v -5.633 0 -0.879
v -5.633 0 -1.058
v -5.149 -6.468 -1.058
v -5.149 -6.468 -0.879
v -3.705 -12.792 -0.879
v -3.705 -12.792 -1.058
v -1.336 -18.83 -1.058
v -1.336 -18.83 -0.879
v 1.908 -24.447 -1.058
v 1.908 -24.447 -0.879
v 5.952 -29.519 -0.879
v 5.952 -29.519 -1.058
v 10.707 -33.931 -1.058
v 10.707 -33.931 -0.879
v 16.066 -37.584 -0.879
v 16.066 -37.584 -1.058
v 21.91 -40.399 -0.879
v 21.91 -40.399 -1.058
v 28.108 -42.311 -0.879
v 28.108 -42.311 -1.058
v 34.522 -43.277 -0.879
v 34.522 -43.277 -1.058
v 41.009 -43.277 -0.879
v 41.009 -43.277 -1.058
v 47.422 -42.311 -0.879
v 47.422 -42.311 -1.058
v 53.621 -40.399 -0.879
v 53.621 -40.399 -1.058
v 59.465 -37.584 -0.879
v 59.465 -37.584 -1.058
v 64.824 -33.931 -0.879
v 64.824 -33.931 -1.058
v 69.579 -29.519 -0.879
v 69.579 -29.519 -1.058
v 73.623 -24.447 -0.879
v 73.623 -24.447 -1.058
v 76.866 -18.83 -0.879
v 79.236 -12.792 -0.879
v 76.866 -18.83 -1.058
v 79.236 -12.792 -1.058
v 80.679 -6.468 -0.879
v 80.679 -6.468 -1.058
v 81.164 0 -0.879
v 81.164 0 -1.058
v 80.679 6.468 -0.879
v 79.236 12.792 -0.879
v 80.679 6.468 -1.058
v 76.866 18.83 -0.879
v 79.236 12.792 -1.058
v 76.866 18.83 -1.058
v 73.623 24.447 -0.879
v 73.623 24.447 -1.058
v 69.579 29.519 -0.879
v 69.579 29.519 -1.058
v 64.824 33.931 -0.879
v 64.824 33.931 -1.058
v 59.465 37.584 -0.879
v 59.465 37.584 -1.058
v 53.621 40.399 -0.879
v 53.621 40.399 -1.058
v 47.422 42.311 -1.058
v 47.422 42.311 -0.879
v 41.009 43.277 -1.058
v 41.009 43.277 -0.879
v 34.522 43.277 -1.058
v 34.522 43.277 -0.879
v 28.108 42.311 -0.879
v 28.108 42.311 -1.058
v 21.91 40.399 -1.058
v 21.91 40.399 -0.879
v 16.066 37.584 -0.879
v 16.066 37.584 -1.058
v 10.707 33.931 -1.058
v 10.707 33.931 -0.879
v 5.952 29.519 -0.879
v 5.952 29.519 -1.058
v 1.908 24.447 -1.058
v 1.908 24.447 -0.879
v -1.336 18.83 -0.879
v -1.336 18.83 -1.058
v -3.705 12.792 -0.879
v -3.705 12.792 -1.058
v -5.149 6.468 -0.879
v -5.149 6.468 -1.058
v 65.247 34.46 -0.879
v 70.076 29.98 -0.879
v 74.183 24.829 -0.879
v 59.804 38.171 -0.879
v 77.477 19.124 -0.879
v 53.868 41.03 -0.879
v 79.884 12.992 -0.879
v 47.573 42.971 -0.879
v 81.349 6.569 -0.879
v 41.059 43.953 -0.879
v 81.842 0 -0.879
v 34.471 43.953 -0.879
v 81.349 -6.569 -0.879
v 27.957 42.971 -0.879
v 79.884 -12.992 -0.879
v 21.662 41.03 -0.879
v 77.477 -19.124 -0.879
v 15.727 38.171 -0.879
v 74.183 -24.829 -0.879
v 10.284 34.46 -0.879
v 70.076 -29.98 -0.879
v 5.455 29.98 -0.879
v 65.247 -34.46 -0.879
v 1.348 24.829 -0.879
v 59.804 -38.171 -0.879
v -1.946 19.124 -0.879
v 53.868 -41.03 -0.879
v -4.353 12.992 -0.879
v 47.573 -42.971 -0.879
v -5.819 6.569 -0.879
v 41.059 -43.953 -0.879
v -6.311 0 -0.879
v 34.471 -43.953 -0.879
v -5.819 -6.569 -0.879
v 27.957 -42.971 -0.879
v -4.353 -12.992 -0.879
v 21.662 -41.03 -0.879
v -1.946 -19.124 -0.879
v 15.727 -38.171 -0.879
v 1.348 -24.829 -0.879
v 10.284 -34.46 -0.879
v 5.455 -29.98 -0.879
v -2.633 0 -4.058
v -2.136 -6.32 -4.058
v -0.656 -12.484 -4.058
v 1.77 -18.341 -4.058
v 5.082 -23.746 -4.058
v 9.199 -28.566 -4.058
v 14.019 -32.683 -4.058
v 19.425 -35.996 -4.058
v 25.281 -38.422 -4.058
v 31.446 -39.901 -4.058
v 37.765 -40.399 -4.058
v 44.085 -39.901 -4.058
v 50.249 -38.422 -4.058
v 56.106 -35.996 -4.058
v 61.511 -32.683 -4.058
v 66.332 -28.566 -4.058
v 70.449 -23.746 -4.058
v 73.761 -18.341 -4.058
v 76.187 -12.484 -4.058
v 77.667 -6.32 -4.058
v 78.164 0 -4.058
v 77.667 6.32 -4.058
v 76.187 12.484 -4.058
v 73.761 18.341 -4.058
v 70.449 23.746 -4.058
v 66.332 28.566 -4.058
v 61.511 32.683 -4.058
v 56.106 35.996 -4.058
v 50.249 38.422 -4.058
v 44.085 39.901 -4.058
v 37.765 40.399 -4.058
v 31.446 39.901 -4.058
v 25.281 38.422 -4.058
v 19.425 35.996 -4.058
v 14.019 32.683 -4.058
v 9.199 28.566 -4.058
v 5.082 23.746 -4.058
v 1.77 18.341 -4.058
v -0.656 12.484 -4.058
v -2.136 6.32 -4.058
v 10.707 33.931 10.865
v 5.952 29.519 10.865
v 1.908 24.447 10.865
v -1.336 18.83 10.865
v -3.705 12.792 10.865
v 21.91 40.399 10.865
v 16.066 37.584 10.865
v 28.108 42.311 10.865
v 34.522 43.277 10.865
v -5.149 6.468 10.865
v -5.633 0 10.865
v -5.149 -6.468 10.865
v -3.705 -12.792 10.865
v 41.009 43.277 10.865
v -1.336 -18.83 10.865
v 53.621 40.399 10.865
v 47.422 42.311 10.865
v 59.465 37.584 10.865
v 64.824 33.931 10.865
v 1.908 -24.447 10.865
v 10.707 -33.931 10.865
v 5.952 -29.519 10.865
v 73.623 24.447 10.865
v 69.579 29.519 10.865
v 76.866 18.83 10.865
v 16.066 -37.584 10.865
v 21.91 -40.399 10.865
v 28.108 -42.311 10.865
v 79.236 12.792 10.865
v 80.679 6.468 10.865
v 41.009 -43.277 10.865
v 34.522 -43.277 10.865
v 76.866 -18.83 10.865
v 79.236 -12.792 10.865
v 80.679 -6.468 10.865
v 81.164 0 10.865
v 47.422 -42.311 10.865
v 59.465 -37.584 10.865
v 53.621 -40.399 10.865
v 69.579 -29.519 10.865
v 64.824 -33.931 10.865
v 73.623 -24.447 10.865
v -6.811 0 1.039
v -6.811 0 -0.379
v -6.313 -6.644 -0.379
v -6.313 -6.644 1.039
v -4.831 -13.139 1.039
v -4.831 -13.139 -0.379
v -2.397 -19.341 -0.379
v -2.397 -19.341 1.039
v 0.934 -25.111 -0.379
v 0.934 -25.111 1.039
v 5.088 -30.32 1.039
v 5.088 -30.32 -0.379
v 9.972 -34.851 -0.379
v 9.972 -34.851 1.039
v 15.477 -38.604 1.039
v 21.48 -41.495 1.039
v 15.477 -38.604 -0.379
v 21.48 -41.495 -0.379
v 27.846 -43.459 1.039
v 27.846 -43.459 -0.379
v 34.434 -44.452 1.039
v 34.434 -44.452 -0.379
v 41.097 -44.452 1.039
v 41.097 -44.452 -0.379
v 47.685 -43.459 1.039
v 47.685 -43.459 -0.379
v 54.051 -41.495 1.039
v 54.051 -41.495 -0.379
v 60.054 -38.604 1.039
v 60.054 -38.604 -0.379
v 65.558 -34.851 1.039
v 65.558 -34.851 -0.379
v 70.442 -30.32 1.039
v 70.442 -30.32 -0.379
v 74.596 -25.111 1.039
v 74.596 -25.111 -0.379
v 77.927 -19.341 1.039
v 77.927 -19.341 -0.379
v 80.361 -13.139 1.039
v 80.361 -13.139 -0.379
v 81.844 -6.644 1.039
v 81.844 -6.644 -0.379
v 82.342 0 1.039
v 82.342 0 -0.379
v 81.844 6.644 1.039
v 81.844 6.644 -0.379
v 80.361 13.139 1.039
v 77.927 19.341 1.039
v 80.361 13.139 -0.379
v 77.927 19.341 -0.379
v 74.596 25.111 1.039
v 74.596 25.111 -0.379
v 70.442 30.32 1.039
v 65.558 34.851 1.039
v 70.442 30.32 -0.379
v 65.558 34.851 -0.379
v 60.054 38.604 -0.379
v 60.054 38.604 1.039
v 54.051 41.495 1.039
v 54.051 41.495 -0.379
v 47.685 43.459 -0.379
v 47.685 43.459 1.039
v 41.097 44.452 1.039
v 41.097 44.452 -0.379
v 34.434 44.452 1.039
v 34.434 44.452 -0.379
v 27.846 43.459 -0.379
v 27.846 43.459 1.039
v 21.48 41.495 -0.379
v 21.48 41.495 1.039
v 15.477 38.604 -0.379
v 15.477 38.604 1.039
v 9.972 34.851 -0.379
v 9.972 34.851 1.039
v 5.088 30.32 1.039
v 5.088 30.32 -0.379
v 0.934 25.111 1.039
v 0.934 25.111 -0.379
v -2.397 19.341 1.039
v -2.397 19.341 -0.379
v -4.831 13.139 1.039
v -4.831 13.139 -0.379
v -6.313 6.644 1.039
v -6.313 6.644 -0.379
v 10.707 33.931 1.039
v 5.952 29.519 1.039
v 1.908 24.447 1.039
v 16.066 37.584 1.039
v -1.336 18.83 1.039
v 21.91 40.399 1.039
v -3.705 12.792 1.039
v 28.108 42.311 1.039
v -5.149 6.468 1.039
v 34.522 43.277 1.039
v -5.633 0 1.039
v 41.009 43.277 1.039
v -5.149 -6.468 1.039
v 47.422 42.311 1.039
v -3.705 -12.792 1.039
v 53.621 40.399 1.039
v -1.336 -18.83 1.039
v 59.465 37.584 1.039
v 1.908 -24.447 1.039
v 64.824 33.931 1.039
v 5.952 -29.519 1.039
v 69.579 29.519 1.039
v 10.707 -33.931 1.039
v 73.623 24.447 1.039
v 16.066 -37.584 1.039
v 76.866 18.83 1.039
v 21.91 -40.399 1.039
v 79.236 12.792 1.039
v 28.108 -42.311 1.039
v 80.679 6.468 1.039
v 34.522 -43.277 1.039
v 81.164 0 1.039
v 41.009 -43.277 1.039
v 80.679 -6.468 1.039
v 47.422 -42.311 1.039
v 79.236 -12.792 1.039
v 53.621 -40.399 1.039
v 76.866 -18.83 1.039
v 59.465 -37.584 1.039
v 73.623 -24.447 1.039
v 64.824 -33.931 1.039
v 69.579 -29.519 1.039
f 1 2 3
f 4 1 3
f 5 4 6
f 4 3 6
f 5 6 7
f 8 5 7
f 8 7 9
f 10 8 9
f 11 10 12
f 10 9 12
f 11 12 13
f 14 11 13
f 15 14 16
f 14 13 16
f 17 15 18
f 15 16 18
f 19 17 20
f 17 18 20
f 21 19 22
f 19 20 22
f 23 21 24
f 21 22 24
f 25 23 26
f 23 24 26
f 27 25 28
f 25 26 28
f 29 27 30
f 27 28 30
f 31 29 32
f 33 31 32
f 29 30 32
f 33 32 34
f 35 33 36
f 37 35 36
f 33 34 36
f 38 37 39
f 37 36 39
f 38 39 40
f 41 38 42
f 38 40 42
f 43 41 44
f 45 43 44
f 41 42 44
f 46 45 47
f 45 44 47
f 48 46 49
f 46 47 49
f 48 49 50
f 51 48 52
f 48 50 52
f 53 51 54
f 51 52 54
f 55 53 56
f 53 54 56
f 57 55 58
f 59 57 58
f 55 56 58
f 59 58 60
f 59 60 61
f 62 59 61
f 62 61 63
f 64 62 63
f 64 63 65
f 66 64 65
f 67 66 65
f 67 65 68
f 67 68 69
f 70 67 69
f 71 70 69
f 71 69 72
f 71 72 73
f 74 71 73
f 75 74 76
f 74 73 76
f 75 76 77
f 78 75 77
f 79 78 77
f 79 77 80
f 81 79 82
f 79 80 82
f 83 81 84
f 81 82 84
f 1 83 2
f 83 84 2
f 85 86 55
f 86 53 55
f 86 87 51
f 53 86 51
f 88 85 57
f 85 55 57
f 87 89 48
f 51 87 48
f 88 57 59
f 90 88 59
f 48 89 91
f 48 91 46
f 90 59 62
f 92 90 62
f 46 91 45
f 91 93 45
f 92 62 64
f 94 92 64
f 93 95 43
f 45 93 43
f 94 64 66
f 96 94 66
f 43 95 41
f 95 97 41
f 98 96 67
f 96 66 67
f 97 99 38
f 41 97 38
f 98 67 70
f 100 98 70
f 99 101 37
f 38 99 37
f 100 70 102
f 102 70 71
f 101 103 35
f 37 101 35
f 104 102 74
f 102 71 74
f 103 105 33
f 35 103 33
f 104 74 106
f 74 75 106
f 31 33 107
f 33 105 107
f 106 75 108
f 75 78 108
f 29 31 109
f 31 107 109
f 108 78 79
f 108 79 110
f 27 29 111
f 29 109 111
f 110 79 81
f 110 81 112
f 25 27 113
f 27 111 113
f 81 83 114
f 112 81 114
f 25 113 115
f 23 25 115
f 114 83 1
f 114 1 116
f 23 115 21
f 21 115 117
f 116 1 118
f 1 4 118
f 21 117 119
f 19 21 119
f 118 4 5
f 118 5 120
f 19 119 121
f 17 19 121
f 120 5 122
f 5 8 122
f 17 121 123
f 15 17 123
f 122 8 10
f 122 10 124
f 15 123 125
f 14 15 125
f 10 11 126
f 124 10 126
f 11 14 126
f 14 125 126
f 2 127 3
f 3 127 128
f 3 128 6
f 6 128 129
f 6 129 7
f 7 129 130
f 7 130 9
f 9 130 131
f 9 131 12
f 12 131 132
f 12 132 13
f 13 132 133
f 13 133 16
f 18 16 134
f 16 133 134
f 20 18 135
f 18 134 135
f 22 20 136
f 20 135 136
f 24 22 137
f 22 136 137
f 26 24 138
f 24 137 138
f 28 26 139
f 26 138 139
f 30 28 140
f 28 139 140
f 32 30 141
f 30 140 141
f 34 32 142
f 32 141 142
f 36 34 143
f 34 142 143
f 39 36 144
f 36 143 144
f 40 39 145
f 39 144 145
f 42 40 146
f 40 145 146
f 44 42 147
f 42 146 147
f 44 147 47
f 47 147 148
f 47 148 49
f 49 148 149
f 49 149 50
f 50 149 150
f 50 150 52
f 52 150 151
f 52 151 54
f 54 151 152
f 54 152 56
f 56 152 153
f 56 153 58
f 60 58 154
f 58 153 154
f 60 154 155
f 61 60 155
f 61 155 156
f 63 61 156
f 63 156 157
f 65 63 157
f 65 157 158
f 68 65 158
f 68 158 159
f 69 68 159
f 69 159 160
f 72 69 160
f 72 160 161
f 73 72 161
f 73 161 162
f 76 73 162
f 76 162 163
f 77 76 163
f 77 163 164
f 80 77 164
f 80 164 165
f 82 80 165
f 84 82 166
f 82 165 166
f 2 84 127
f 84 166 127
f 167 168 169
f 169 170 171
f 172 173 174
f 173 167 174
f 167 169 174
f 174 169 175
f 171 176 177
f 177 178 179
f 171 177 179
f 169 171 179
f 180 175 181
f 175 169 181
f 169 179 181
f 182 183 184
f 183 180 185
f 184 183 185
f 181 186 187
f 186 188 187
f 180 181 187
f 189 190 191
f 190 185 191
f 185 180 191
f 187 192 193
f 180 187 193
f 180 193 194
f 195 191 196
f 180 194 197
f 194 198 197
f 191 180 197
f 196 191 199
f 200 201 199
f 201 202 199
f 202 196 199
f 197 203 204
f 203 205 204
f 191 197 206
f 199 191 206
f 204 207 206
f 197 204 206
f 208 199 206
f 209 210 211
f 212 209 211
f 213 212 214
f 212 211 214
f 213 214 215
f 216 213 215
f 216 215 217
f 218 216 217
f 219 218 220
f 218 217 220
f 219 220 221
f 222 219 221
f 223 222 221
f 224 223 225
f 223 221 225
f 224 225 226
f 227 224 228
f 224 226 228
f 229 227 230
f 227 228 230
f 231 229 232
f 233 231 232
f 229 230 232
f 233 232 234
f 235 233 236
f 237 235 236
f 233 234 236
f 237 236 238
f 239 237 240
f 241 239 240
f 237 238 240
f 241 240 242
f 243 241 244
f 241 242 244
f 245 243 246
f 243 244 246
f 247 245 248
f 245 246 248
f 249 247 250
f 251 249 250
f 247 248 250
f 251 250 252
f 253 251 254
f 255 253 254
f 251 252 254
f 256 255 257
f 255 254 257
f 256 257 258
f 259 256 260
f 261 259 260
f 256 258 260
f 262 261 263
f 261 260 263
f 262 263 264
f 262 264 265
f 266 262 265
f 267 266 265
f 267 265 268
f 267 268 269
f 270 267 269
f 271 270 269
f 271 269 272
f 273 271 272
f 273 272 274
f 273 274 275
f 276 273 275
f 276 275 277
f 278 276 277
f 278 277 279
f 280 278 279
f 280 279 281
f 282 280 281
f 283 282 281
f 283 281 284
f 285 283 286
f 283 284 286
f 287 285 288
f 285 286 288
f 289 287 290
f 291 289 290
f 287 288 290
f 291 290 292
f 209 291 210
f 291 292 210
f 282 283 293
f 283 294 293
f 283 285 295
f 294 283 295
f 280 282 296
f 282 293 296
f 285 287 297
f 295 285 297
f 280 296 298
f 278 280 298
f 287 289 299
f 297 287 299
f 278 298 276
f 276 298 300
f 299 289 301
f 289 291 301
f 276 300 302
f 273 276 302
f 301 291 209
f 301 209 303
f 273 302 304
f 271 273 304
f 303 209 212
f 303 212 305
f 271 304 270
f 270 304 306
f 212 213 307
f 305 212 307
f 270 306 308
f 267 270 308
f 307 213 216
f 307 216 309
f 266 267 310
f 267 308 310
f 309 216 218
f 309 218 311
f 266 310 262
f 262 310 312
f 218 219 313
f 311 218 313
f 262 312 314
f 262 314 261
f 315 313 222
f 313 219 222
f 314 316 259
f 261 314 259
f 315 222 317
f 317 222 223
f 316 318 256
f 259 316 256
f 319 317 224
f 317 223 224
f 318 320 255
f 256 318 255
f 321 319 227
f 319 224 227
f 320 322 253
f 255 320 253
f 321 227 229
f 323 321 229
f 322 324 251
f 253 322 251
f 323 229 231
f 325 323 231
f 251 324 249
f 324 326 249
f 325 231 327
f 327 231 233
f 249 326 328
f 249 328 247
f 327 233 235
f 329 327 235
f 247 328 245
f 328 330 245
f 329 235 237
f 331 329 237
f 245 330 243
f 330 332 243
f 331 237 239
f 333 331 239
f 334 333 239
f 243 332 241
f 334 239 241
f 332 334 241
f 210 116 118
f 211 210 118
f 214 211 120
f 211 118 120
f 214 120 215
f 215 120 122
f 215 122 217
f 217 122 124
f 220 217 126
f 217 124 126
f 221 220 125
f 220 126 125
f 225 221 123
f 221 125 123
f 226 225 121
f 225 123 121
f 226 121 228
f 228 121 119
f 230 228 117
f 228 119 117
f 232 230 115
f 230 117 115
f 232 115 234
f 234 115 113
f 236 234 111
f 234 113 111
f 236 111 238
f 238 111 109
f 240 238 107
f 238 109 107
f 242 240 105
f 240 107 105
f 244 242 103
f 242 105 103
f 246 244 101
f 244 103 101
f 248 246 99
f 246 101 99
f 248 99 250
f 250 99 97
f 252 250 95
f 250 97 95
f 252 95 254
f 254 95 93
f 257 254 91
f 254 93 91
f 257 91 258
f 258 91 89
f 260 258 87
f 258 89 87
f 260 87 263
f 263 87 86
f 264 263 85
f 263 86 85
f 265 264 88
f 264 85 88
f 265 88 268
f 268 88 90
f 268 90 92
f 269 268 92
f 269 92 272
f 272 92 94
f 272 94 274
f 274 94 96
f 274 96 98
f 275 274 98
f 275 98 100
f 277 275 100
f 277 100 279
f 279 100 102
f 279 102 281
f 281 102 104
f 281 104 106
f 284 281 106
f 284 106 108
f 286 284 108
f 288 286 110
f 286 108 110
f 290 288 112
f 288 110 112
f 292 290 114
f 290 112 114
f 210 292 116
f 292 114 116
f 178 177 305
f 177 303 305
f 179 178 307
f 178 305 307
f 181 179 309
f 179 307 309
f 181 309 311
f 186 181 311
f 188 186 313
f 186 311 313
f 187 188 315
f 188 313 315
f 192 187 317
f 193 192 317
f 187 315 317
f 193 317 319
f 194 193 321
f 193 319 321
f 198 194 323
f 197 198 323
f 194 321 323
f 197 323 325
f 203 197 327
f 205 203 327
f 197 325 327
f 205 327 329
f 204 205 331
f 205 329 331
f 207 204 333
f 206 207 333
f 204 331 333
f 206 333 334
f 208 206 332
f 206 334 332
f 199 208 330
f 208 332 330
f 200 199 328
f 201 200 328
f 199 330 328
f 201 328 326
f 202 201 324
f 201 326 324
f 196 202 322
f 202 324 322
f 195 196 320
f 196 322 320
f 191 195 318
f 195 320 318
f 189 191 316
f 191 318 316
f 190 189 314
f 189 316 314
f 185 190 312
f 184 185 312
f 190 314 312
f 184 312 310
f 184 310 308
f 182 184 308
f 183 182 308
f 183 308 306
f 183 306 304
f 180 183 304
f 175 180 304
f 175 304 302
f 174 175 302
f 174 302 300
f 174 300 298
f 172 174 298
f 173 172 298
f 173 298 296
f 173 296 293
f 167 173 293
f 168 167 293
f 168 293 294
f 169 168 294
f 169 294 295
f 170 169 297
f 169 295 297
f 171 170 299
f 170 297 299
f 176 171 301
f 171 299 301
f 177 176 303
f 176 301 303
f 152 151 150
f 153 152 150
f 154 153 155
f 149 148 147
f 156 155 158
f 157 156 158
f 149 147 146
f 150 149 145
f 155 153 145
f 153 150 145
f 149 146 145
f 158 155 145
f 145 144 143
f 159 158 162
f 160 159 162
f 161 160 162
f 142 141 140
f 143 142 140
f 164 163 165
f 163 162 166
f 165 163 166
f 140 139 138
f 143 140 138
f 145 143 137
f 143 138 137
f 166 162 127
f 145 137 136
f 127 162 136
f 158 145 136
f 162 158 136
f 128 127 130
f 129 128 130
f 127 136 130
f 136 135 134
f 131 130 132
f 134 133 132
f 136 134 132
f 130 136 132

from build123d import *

# Parameters (mm, degrees)
F3_SIZE = 0.5
F4_SIZE = 3


with BuildPart() as f2:
    # F1 (on face) → F2 (revolve)
    with BuildSketch(Plane.XZ):
        Polygon((37.7653092146, 10.8646117151), (-5.6334966794, 10.8646117151), (-5.6334966794, 1.0394179262), (-6.8111736327, 1.0394179262), (-6.8111736327, -0.8785137325), (-5.6334966794, -0.8785137325), (-5.6334966794, -4.0582427464), (37.7653092146, -4.0582427464), align=None)
    revolve(axis=Axis((37.7653092146, 0, 3.4031844843), (0, 0, 1)))

    # F3
    f3_edges = [f2.edges().sort_by_distance(p)[0] for p in [
        (82.341792, 0, -0.878514),
    ]]
    chamfer(f3_edges, length=F3_SIZE)

    # F4
    f4_edges = [f2.edges().sort_by_distance(p)[0] for p in [
        (81.164115, 0, -4.058243),
    ]]
    chamfer(f4_edges, length=F4_SIZE)


solid = f2.part
